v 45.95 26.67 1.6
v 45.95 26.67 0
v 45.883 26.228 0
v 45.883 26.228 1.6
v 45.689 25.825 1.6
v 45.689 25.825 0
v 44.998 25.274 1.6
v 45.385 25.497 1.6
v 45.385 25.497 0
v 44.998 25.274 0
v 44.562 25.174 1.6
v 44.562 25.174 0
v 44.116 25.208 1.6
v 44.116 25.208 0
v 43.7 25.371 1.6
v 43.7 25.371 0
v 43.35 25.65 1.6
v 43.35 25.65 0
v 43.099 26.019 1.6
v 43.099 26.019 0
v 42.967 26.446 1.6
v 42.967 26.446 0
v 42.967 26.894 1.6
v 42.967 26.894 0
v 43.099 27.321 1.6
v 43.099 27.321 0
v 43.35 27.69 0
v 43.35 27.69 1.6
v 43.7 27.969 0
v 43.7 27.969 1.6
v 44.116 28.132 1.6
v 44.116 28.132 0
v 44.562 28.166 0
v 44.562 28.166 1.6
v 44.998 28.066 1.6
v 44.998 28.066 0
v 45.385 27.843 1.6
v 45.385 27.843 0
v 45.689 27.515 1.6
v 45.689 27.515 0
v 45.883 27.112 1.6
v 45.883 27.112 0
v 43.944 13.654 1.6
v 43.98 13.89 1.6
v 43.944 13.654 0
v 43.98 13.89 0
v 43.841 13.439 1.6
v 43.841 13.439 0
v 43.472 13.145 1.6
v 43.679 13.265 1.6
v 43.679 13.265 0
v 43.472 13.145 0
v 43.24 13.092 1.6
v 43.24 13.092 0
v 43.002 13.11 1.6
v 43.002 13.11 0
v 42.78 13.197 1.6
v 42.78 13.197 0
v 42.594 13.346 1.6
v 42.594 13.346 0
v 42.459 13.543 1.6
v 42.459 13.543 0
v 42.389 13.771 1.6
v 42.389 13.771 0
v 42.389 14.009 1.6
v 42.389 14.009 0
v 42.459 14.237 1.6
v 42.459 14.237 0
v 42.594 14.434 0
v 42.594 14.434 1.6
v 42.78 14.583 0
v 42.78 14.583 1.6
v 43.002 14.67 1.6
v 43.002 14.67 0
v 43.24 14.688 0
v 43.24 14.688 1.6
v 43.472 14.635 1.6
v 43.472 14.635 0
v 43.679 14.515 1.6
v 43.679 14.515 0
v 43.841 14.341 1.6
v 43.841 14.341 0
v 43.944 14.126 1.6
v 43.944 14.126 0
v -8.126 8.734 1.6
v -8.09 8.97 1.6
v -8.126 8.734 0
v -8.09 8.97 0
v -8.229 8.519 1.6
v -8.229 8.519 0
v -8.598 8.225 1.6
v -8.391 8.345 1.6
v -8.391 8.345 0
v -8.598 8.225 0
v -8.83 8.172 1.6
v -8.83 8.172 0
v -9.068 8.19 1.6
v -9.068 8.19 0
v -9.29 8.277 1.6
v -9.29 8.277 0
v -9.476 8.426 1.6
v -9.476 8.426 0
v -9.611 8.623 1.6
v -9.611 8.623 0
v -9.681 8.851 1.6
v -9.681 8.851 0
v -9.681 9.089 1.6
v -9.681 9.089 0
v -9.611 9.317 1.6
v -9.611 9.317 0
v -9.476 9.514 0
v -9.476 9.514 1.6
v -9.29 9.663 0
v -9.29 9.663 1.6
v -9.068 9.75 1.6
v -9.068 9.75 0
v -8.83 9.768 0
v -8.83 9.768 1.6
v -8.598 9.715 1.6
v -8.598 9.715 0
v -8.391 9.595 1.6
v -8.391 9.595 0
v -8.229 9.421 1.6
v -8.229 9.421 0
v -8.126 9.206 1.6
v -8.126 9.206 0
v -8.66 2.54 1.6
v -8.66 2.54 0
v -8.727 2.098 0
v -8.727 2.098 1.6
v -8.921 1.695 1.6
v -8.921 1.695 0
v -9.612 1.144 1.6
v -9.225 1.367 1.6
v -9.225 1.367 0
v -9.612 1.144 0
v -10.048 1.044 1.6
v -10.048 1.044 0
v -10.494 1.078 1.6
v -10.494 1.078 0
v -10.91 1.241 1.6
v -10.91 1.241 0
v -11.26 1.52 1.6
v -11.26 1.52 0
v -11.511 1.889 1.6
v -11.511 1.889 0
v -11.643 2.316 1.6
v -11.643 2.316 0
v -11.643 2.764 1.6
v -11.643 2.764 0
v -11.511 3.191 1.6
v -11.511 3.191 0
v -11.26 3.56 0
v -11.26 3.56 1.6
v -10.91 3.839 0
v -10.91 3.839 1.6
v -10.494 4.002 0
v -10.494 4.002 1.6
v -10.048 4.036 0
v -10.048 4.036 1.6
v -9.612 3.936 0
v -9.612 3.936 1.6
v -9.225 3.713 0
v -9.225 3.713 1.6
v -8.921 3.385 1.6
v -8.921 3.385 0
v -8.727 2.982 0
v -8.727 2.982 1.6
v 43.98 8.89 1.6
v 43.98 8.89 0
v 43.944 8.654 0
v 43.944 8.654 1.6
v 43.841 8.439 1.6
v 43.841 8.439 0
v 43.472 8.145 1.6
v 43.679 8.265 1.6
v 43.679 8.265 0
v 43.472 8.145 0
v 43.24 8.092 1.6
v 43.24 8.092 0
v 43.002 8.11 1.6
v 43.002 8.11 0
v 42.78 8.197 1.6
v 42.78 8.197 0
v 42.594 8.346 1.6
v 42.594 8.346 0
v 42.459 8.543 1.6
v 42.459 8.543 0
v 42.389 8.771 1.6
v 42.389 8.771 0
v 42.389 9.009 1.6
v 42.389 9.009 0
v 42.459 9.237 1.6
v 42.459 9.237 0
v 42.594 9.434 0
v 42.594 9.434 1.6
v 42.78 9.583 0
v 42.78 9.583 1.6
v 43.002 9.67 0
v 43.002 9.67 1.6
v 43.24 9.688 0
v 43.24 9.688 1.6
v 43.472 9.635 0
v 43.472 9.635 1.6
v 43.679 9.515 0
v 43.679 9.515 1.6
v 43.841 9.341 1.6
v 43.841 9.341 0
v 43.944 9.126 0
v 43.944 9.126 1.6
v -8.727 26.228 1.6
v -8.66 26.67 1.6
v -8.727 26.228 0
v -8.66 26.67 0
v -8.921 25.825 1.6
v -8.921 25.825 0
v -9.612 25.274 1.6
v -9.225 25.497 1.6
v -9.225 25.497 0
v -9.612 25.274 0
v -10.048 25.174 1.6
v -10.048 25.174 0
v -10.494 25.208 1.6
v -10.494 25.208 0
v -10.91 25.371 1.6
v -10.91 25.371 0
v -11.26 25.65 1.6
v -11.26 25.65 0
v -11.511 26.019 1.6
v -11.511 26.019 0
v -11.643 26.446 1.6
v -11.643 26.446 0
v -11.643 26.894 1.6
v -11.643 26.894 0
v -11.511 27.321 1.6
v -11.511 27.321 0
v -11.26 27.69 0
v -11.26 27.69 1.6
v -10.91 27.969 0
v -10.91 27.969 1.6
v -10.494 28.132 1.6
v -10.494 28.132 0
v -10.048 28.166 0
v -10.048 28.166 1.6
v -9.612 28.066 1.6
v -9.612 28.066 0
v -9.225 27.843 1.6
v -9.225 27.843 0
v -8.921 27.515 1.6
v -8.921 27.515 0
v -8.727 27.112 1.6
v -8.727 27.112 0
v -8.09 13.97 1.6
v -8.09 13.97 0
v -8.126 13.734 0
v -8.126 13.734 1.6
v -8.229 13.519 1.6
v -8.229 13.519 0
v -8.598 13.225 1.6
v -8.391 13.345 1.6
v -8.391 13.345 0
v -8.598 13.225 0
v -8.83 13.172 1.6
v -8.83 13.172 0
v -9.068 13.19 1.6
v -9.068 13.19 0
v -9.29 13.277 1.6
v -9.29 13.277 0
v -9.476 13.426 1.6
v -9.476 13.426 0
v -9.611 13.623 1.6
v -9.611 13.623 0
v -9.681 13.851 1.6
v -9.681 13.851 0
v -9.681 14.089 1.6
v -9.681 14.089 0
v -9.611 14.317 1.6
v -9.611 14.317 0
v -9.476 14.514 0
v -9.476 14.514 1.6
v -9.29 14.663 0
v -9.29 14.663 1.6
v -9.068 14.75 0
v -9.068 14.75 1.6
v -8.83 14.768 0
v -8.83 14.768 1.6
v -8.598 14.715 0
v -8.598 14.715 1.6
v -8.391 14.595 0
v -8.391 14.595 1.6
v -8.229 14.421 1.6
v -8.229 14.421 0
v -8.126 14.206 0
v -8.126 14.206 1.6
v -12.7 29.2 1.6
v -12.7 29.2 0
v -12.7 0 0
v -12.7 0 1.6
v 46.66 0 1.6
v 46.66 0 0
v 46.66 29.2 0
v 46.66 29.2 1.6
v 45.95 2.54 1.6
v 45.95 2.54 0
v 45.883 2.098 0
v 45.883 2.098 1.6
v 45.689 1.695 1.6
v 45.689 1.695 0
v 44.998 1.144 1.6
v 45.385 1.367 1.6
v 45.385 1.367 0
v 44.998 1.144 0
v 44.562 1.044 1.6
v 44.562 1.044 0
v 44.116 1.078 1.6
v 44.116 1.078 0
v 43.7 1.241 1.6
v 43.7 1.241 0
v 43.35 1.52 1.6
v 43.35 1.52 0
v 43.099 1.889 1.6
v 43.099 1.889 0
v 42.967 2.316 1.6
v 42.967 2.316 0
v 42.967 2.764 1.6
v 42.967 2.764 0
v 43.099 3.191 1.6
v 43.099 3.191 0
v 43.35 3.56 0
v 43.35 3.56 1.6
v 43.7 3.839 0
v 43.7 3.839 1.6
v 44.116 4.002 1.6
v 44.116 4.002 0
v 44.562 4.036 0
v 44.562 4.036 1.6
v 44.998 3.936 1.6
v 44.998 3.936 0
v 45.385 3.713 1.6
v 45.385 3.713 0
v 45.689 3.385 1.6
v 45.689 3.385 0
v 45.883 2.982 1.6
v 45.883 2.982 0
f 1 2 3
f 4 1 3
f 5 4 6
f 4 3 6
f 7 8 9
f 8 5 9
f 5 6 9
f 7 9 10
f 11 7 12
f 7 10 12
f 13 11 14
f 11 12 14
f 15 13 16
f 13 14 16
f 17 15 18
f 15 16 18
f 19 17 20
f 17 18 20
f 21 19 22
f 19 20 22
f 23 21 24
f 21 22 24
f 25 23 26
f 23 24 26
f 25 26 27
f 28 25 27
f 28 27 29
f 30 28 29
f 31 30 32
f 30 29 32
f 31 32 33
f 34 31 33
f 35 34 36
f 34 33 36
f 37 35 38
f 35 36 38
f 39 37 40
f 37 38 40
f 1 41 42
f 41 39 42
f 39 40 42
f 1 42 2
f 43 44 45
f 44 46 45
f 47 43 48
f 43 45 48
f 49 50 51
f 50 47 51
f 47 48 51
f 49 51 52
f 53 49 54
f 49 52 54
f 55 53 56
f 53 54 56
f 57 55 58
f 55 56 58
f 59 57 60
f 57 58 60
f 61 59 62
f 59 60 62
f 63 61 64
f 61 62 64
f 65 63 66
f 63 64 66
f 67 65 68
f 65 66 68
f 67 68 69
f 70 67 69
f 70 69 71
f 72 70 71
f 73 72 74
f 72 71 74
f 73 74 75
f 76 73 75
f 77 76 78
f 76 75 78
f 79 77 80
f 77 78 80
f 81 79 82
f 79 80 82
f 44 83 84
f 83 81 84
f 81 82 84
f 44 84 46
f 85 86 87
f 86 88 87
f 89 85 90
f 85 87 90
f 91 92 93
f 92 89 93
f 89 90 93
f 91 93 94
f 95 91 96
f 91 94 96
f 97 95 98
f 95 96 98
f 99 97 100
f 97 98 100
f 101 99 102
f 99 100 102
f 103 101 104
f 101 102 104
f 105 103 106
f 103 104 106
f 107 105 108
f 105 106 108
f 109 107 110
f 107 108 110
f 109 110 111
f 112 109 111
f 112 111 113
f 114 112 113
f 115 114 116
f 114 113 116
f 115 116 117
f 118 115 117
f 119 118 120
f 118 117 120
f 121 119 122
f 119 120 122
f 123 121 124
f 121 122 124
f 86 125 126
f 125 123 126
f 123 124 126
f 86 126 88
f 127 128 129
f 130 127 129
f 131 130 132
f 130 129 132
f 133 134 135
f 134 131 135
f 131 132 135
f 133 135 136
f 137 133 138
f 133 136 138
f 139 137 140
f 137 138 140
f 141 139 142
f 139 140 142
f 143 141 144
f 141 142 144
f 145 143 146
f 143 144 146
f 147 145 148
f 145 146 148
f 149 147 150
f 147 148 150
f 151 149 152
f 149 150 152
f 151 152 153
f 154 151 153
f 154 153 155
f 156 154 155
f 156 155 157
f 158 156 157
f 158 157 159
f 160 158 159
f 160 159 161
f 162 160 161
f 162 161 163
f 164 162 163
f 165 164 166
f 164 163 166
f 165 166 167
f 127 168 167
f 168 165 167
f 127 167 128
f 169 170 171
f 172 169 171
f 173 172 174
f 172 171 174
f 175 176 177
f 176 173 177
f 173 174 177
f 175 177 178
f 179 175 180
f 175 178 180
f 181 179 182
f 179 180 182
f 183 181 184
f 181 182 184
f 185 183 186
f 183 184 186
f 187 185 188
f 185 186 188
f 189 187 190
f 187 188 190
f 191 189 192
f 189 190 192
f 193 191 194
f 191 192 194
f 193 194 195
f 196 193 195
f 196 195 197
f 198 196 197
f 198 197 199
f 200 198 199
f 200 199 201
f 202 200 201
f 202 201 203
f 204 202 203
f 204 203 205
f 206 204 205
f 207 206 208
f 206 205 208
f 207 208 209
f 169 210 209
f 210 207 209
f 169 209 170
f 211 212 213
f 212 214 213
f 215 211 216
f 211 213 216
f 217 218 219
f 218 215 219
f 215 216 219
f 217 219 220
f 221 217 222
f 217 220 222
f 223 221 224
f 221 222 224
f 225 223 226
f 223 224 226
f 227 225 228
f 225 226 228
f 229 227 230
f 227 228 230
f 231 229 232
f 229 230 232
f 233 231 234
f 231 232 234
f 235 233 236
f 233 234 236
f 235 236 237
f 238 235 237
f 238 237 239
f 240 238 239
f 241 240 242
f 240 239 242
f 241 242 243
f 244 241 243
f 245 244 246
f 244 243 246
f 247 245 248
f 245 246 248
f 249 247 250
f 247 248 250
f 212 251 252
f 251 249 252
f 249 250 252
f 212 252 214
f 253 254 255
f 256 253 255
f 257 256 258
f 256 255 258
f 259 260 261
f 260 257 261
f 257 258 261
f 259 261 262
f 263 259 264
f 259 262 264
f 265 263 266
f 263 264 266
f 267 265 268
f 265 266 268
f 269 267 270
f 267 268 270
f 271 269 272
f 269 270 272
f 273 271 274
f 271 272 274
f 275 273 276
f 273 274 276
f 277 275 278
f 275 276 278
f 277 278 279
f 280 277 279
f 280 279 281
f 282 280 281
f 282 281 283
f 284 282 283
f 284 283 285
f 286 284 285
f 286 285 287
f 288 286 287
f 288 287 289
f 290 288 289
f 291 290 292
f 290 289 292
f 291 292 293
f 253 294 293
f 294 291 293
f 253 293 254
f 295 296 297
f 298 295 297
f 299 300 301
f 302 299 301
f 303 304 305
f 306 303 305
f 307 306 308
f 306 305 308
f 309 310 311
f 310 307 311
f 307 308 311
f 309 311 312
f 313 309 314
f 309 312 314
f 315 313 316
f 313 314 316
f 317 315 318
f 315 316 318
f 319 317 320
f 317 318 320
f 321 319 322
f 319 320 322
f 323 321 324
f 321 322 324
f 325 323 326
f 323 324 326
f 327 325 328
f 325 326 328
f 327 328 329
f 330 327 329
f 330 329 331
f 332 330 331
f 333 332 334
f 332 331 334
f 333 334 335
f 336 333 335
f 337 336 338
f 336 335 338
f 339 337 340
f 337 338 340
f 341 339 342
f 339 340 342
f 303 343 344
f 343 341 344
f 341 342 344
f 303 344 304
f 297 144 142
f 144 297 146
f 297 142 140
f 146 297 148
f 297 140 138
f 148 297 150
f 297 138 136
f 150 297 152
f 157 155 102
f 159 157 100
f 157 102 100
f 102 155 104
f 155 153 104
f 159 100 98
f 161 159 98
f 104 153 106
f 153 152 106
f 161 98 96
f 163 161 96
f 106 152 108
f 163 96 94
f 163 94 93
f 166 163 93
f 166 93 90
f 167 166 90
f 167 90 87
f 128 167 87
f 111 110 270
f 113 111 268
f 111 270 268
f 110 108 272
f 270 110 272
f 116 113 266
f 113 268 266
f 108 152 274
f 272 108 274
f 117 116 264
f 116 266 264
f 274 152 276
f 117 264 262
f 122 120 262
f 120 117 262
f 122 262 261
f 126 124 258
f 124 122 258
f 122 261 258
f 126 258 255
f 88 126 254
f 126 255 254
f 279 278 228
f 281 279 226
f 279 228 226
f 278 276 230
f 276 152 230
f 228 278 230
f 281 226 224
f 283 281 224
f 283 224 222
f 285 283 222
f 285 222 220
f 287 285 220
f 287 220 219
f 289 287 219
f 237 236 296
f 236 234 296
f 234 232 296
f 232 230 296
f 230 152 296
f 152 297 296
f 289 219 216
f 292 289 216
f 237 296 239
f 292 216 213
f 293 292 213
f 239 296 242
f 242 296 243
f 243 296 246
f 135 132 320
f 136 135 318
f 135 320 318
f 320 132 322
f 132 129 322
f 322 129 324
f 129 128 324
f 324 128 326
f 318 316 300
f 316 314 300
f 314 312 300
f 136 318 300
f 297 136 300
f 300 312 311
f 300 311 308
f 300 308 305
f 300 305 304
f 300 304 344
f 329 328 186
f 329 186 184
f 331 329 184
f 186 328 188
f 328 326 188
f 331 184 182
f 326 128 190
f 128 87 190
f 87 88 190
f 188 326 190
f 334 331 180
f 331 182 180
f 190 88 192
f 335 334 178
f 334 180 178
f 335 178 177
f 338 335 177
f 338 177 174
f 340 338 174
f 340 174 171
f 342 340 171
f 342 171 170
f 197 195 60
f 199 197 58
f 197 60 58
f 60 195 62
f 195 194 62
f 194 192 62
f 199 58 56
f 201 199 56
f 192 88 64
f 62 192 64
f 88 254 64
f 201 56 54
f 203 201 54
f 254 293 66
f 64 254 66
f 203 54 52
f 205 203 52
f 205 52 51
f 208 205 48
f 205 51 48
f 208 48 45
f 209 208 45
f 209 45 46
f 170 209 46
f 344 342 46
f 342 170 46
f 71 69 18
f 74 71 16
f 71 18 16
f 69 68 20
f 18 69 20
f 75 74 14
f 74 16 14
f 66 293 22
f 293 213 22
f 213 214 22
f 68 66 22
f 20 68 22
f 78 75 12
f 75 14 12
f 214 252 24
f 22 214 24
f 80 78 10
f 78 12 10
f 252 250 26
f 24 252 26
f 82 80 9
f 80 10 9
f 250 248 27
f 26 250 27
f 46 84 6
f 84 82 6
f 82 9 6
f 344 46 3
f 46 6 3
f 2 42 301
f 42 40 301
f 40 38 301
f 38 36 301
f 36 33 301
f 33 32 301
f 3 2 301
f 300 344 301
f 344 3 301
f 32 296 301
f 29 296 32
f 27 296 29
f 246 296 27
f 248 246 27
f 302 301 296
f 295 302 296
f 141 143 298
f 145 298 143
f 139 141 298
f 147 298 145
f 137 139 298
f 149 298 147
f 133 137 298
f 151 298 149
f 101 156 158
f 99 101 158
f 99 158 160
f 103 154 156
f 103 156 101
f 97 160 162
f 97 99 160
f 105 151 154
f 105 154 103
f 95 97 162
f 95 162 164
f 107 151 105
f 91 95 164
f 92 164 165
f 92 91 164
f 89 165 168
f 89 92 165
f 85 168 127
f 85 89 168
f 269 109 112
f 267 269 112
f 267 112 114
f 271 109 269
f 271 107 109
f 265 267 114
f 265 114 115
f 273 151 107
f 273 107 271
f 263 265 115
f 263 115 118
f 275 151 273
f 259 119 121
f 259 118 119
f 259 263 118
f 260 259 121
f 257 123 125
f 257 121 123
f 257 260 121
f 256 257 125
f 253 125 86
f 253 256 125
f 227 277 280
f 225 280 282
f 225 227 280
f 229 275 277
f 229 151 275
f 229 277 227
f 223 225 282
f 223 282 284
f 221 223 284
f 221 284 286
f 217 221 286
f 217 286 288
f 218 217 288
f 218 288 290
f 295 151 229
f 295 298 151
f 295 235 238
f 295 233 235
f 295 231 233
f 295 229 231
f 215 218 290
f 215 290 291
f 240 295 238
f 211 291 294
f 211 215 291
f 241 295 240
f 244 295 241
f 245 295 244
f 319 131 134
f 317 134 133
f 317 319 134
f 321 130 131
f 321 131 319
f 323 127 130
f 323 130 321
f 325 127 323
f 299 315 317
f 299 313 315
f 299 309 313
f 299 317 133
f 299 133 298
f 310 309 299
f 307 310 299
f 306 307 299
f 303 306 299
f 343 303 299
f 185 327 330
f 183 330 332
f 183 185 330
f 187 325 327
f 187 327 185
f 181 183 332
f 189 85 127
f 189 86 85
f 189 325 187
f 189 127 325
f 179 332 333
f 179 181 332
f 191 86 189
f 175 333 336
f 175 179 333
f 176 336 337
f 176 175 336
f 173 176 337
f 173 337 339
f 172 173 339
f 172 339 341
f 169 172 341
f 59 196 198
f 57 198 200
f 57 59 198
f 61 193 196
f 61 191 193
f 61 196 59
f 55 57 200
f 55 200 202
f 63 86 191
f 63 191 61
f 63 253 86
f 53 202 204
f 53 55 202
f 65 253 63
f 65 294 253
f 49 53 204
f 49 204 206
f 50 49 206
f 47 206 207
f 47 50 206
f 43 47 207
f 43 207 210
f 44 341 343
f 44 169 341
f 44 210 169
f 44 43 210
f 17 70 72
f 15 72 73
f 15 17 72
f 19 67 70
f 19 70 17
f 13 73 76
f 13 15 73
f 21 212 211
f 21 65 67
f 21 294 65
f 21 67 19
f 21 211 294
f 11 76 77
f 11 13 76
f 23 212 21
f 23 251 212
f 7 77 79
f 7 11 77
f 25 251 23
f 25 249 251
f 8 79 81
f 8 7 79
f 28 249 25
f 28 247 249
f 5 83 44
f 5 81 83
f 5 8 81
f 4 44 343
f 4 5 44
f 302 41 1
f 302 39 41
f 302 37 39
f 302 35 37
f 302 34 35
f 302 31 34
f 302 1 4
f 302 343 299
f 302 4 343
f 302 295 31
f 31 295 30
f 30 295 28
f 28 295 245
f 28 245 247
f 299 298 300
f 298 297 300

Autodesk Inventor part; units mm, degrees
ref_plane "YZ Plane" through (0, 0, 0) normal (1, 0, 0) x (0, 1, 0)
ref_plane "XZ Plane" through (0, 0, 0) normal (0, 1, 0) x (-1, 0, 0)
ref_plane "XY Plane" through (0, 0, 0) normal (0, 0, 1) x (1, 0, 0)
sketch "Эскиз1" plane through (0, 0, 0) normal (0, 0, 1) x (1, 0, 0)
  line L0 (-12.7, 0) -> (46.66, 0)
  line L1 (46.66, 0) -> (46.66, 29.2)
  line L2 (46.66, 29.2) -> (-12.7, 29.2)
  line L3 (-12.7, 29.2) -> (-12.7, 0)
  circle A0 centre (-8.89, 13.97) radius 0.8
  circle A1 centre (-8.89, 8.97) radius 0.8
  circle A2 centre (43.18, 8.89) radius 0.8
  circle A3 centre (43.18, 13.89) radius 0.8
  circle A4 centre (-10.16, 26.67) radius 1.5
  circle A5 centre (44.45, 26.67) radius 1.5
  circle A6 centre (44.45, 2.54) radius 1.5
  circle A7 centre (-10.16, 2.54) radius 1.5
extrude "untitled.brdКонтур" add sketch "Эскиз1" along normal blind 1.6
properties part number "untitled.brdКонтур"
